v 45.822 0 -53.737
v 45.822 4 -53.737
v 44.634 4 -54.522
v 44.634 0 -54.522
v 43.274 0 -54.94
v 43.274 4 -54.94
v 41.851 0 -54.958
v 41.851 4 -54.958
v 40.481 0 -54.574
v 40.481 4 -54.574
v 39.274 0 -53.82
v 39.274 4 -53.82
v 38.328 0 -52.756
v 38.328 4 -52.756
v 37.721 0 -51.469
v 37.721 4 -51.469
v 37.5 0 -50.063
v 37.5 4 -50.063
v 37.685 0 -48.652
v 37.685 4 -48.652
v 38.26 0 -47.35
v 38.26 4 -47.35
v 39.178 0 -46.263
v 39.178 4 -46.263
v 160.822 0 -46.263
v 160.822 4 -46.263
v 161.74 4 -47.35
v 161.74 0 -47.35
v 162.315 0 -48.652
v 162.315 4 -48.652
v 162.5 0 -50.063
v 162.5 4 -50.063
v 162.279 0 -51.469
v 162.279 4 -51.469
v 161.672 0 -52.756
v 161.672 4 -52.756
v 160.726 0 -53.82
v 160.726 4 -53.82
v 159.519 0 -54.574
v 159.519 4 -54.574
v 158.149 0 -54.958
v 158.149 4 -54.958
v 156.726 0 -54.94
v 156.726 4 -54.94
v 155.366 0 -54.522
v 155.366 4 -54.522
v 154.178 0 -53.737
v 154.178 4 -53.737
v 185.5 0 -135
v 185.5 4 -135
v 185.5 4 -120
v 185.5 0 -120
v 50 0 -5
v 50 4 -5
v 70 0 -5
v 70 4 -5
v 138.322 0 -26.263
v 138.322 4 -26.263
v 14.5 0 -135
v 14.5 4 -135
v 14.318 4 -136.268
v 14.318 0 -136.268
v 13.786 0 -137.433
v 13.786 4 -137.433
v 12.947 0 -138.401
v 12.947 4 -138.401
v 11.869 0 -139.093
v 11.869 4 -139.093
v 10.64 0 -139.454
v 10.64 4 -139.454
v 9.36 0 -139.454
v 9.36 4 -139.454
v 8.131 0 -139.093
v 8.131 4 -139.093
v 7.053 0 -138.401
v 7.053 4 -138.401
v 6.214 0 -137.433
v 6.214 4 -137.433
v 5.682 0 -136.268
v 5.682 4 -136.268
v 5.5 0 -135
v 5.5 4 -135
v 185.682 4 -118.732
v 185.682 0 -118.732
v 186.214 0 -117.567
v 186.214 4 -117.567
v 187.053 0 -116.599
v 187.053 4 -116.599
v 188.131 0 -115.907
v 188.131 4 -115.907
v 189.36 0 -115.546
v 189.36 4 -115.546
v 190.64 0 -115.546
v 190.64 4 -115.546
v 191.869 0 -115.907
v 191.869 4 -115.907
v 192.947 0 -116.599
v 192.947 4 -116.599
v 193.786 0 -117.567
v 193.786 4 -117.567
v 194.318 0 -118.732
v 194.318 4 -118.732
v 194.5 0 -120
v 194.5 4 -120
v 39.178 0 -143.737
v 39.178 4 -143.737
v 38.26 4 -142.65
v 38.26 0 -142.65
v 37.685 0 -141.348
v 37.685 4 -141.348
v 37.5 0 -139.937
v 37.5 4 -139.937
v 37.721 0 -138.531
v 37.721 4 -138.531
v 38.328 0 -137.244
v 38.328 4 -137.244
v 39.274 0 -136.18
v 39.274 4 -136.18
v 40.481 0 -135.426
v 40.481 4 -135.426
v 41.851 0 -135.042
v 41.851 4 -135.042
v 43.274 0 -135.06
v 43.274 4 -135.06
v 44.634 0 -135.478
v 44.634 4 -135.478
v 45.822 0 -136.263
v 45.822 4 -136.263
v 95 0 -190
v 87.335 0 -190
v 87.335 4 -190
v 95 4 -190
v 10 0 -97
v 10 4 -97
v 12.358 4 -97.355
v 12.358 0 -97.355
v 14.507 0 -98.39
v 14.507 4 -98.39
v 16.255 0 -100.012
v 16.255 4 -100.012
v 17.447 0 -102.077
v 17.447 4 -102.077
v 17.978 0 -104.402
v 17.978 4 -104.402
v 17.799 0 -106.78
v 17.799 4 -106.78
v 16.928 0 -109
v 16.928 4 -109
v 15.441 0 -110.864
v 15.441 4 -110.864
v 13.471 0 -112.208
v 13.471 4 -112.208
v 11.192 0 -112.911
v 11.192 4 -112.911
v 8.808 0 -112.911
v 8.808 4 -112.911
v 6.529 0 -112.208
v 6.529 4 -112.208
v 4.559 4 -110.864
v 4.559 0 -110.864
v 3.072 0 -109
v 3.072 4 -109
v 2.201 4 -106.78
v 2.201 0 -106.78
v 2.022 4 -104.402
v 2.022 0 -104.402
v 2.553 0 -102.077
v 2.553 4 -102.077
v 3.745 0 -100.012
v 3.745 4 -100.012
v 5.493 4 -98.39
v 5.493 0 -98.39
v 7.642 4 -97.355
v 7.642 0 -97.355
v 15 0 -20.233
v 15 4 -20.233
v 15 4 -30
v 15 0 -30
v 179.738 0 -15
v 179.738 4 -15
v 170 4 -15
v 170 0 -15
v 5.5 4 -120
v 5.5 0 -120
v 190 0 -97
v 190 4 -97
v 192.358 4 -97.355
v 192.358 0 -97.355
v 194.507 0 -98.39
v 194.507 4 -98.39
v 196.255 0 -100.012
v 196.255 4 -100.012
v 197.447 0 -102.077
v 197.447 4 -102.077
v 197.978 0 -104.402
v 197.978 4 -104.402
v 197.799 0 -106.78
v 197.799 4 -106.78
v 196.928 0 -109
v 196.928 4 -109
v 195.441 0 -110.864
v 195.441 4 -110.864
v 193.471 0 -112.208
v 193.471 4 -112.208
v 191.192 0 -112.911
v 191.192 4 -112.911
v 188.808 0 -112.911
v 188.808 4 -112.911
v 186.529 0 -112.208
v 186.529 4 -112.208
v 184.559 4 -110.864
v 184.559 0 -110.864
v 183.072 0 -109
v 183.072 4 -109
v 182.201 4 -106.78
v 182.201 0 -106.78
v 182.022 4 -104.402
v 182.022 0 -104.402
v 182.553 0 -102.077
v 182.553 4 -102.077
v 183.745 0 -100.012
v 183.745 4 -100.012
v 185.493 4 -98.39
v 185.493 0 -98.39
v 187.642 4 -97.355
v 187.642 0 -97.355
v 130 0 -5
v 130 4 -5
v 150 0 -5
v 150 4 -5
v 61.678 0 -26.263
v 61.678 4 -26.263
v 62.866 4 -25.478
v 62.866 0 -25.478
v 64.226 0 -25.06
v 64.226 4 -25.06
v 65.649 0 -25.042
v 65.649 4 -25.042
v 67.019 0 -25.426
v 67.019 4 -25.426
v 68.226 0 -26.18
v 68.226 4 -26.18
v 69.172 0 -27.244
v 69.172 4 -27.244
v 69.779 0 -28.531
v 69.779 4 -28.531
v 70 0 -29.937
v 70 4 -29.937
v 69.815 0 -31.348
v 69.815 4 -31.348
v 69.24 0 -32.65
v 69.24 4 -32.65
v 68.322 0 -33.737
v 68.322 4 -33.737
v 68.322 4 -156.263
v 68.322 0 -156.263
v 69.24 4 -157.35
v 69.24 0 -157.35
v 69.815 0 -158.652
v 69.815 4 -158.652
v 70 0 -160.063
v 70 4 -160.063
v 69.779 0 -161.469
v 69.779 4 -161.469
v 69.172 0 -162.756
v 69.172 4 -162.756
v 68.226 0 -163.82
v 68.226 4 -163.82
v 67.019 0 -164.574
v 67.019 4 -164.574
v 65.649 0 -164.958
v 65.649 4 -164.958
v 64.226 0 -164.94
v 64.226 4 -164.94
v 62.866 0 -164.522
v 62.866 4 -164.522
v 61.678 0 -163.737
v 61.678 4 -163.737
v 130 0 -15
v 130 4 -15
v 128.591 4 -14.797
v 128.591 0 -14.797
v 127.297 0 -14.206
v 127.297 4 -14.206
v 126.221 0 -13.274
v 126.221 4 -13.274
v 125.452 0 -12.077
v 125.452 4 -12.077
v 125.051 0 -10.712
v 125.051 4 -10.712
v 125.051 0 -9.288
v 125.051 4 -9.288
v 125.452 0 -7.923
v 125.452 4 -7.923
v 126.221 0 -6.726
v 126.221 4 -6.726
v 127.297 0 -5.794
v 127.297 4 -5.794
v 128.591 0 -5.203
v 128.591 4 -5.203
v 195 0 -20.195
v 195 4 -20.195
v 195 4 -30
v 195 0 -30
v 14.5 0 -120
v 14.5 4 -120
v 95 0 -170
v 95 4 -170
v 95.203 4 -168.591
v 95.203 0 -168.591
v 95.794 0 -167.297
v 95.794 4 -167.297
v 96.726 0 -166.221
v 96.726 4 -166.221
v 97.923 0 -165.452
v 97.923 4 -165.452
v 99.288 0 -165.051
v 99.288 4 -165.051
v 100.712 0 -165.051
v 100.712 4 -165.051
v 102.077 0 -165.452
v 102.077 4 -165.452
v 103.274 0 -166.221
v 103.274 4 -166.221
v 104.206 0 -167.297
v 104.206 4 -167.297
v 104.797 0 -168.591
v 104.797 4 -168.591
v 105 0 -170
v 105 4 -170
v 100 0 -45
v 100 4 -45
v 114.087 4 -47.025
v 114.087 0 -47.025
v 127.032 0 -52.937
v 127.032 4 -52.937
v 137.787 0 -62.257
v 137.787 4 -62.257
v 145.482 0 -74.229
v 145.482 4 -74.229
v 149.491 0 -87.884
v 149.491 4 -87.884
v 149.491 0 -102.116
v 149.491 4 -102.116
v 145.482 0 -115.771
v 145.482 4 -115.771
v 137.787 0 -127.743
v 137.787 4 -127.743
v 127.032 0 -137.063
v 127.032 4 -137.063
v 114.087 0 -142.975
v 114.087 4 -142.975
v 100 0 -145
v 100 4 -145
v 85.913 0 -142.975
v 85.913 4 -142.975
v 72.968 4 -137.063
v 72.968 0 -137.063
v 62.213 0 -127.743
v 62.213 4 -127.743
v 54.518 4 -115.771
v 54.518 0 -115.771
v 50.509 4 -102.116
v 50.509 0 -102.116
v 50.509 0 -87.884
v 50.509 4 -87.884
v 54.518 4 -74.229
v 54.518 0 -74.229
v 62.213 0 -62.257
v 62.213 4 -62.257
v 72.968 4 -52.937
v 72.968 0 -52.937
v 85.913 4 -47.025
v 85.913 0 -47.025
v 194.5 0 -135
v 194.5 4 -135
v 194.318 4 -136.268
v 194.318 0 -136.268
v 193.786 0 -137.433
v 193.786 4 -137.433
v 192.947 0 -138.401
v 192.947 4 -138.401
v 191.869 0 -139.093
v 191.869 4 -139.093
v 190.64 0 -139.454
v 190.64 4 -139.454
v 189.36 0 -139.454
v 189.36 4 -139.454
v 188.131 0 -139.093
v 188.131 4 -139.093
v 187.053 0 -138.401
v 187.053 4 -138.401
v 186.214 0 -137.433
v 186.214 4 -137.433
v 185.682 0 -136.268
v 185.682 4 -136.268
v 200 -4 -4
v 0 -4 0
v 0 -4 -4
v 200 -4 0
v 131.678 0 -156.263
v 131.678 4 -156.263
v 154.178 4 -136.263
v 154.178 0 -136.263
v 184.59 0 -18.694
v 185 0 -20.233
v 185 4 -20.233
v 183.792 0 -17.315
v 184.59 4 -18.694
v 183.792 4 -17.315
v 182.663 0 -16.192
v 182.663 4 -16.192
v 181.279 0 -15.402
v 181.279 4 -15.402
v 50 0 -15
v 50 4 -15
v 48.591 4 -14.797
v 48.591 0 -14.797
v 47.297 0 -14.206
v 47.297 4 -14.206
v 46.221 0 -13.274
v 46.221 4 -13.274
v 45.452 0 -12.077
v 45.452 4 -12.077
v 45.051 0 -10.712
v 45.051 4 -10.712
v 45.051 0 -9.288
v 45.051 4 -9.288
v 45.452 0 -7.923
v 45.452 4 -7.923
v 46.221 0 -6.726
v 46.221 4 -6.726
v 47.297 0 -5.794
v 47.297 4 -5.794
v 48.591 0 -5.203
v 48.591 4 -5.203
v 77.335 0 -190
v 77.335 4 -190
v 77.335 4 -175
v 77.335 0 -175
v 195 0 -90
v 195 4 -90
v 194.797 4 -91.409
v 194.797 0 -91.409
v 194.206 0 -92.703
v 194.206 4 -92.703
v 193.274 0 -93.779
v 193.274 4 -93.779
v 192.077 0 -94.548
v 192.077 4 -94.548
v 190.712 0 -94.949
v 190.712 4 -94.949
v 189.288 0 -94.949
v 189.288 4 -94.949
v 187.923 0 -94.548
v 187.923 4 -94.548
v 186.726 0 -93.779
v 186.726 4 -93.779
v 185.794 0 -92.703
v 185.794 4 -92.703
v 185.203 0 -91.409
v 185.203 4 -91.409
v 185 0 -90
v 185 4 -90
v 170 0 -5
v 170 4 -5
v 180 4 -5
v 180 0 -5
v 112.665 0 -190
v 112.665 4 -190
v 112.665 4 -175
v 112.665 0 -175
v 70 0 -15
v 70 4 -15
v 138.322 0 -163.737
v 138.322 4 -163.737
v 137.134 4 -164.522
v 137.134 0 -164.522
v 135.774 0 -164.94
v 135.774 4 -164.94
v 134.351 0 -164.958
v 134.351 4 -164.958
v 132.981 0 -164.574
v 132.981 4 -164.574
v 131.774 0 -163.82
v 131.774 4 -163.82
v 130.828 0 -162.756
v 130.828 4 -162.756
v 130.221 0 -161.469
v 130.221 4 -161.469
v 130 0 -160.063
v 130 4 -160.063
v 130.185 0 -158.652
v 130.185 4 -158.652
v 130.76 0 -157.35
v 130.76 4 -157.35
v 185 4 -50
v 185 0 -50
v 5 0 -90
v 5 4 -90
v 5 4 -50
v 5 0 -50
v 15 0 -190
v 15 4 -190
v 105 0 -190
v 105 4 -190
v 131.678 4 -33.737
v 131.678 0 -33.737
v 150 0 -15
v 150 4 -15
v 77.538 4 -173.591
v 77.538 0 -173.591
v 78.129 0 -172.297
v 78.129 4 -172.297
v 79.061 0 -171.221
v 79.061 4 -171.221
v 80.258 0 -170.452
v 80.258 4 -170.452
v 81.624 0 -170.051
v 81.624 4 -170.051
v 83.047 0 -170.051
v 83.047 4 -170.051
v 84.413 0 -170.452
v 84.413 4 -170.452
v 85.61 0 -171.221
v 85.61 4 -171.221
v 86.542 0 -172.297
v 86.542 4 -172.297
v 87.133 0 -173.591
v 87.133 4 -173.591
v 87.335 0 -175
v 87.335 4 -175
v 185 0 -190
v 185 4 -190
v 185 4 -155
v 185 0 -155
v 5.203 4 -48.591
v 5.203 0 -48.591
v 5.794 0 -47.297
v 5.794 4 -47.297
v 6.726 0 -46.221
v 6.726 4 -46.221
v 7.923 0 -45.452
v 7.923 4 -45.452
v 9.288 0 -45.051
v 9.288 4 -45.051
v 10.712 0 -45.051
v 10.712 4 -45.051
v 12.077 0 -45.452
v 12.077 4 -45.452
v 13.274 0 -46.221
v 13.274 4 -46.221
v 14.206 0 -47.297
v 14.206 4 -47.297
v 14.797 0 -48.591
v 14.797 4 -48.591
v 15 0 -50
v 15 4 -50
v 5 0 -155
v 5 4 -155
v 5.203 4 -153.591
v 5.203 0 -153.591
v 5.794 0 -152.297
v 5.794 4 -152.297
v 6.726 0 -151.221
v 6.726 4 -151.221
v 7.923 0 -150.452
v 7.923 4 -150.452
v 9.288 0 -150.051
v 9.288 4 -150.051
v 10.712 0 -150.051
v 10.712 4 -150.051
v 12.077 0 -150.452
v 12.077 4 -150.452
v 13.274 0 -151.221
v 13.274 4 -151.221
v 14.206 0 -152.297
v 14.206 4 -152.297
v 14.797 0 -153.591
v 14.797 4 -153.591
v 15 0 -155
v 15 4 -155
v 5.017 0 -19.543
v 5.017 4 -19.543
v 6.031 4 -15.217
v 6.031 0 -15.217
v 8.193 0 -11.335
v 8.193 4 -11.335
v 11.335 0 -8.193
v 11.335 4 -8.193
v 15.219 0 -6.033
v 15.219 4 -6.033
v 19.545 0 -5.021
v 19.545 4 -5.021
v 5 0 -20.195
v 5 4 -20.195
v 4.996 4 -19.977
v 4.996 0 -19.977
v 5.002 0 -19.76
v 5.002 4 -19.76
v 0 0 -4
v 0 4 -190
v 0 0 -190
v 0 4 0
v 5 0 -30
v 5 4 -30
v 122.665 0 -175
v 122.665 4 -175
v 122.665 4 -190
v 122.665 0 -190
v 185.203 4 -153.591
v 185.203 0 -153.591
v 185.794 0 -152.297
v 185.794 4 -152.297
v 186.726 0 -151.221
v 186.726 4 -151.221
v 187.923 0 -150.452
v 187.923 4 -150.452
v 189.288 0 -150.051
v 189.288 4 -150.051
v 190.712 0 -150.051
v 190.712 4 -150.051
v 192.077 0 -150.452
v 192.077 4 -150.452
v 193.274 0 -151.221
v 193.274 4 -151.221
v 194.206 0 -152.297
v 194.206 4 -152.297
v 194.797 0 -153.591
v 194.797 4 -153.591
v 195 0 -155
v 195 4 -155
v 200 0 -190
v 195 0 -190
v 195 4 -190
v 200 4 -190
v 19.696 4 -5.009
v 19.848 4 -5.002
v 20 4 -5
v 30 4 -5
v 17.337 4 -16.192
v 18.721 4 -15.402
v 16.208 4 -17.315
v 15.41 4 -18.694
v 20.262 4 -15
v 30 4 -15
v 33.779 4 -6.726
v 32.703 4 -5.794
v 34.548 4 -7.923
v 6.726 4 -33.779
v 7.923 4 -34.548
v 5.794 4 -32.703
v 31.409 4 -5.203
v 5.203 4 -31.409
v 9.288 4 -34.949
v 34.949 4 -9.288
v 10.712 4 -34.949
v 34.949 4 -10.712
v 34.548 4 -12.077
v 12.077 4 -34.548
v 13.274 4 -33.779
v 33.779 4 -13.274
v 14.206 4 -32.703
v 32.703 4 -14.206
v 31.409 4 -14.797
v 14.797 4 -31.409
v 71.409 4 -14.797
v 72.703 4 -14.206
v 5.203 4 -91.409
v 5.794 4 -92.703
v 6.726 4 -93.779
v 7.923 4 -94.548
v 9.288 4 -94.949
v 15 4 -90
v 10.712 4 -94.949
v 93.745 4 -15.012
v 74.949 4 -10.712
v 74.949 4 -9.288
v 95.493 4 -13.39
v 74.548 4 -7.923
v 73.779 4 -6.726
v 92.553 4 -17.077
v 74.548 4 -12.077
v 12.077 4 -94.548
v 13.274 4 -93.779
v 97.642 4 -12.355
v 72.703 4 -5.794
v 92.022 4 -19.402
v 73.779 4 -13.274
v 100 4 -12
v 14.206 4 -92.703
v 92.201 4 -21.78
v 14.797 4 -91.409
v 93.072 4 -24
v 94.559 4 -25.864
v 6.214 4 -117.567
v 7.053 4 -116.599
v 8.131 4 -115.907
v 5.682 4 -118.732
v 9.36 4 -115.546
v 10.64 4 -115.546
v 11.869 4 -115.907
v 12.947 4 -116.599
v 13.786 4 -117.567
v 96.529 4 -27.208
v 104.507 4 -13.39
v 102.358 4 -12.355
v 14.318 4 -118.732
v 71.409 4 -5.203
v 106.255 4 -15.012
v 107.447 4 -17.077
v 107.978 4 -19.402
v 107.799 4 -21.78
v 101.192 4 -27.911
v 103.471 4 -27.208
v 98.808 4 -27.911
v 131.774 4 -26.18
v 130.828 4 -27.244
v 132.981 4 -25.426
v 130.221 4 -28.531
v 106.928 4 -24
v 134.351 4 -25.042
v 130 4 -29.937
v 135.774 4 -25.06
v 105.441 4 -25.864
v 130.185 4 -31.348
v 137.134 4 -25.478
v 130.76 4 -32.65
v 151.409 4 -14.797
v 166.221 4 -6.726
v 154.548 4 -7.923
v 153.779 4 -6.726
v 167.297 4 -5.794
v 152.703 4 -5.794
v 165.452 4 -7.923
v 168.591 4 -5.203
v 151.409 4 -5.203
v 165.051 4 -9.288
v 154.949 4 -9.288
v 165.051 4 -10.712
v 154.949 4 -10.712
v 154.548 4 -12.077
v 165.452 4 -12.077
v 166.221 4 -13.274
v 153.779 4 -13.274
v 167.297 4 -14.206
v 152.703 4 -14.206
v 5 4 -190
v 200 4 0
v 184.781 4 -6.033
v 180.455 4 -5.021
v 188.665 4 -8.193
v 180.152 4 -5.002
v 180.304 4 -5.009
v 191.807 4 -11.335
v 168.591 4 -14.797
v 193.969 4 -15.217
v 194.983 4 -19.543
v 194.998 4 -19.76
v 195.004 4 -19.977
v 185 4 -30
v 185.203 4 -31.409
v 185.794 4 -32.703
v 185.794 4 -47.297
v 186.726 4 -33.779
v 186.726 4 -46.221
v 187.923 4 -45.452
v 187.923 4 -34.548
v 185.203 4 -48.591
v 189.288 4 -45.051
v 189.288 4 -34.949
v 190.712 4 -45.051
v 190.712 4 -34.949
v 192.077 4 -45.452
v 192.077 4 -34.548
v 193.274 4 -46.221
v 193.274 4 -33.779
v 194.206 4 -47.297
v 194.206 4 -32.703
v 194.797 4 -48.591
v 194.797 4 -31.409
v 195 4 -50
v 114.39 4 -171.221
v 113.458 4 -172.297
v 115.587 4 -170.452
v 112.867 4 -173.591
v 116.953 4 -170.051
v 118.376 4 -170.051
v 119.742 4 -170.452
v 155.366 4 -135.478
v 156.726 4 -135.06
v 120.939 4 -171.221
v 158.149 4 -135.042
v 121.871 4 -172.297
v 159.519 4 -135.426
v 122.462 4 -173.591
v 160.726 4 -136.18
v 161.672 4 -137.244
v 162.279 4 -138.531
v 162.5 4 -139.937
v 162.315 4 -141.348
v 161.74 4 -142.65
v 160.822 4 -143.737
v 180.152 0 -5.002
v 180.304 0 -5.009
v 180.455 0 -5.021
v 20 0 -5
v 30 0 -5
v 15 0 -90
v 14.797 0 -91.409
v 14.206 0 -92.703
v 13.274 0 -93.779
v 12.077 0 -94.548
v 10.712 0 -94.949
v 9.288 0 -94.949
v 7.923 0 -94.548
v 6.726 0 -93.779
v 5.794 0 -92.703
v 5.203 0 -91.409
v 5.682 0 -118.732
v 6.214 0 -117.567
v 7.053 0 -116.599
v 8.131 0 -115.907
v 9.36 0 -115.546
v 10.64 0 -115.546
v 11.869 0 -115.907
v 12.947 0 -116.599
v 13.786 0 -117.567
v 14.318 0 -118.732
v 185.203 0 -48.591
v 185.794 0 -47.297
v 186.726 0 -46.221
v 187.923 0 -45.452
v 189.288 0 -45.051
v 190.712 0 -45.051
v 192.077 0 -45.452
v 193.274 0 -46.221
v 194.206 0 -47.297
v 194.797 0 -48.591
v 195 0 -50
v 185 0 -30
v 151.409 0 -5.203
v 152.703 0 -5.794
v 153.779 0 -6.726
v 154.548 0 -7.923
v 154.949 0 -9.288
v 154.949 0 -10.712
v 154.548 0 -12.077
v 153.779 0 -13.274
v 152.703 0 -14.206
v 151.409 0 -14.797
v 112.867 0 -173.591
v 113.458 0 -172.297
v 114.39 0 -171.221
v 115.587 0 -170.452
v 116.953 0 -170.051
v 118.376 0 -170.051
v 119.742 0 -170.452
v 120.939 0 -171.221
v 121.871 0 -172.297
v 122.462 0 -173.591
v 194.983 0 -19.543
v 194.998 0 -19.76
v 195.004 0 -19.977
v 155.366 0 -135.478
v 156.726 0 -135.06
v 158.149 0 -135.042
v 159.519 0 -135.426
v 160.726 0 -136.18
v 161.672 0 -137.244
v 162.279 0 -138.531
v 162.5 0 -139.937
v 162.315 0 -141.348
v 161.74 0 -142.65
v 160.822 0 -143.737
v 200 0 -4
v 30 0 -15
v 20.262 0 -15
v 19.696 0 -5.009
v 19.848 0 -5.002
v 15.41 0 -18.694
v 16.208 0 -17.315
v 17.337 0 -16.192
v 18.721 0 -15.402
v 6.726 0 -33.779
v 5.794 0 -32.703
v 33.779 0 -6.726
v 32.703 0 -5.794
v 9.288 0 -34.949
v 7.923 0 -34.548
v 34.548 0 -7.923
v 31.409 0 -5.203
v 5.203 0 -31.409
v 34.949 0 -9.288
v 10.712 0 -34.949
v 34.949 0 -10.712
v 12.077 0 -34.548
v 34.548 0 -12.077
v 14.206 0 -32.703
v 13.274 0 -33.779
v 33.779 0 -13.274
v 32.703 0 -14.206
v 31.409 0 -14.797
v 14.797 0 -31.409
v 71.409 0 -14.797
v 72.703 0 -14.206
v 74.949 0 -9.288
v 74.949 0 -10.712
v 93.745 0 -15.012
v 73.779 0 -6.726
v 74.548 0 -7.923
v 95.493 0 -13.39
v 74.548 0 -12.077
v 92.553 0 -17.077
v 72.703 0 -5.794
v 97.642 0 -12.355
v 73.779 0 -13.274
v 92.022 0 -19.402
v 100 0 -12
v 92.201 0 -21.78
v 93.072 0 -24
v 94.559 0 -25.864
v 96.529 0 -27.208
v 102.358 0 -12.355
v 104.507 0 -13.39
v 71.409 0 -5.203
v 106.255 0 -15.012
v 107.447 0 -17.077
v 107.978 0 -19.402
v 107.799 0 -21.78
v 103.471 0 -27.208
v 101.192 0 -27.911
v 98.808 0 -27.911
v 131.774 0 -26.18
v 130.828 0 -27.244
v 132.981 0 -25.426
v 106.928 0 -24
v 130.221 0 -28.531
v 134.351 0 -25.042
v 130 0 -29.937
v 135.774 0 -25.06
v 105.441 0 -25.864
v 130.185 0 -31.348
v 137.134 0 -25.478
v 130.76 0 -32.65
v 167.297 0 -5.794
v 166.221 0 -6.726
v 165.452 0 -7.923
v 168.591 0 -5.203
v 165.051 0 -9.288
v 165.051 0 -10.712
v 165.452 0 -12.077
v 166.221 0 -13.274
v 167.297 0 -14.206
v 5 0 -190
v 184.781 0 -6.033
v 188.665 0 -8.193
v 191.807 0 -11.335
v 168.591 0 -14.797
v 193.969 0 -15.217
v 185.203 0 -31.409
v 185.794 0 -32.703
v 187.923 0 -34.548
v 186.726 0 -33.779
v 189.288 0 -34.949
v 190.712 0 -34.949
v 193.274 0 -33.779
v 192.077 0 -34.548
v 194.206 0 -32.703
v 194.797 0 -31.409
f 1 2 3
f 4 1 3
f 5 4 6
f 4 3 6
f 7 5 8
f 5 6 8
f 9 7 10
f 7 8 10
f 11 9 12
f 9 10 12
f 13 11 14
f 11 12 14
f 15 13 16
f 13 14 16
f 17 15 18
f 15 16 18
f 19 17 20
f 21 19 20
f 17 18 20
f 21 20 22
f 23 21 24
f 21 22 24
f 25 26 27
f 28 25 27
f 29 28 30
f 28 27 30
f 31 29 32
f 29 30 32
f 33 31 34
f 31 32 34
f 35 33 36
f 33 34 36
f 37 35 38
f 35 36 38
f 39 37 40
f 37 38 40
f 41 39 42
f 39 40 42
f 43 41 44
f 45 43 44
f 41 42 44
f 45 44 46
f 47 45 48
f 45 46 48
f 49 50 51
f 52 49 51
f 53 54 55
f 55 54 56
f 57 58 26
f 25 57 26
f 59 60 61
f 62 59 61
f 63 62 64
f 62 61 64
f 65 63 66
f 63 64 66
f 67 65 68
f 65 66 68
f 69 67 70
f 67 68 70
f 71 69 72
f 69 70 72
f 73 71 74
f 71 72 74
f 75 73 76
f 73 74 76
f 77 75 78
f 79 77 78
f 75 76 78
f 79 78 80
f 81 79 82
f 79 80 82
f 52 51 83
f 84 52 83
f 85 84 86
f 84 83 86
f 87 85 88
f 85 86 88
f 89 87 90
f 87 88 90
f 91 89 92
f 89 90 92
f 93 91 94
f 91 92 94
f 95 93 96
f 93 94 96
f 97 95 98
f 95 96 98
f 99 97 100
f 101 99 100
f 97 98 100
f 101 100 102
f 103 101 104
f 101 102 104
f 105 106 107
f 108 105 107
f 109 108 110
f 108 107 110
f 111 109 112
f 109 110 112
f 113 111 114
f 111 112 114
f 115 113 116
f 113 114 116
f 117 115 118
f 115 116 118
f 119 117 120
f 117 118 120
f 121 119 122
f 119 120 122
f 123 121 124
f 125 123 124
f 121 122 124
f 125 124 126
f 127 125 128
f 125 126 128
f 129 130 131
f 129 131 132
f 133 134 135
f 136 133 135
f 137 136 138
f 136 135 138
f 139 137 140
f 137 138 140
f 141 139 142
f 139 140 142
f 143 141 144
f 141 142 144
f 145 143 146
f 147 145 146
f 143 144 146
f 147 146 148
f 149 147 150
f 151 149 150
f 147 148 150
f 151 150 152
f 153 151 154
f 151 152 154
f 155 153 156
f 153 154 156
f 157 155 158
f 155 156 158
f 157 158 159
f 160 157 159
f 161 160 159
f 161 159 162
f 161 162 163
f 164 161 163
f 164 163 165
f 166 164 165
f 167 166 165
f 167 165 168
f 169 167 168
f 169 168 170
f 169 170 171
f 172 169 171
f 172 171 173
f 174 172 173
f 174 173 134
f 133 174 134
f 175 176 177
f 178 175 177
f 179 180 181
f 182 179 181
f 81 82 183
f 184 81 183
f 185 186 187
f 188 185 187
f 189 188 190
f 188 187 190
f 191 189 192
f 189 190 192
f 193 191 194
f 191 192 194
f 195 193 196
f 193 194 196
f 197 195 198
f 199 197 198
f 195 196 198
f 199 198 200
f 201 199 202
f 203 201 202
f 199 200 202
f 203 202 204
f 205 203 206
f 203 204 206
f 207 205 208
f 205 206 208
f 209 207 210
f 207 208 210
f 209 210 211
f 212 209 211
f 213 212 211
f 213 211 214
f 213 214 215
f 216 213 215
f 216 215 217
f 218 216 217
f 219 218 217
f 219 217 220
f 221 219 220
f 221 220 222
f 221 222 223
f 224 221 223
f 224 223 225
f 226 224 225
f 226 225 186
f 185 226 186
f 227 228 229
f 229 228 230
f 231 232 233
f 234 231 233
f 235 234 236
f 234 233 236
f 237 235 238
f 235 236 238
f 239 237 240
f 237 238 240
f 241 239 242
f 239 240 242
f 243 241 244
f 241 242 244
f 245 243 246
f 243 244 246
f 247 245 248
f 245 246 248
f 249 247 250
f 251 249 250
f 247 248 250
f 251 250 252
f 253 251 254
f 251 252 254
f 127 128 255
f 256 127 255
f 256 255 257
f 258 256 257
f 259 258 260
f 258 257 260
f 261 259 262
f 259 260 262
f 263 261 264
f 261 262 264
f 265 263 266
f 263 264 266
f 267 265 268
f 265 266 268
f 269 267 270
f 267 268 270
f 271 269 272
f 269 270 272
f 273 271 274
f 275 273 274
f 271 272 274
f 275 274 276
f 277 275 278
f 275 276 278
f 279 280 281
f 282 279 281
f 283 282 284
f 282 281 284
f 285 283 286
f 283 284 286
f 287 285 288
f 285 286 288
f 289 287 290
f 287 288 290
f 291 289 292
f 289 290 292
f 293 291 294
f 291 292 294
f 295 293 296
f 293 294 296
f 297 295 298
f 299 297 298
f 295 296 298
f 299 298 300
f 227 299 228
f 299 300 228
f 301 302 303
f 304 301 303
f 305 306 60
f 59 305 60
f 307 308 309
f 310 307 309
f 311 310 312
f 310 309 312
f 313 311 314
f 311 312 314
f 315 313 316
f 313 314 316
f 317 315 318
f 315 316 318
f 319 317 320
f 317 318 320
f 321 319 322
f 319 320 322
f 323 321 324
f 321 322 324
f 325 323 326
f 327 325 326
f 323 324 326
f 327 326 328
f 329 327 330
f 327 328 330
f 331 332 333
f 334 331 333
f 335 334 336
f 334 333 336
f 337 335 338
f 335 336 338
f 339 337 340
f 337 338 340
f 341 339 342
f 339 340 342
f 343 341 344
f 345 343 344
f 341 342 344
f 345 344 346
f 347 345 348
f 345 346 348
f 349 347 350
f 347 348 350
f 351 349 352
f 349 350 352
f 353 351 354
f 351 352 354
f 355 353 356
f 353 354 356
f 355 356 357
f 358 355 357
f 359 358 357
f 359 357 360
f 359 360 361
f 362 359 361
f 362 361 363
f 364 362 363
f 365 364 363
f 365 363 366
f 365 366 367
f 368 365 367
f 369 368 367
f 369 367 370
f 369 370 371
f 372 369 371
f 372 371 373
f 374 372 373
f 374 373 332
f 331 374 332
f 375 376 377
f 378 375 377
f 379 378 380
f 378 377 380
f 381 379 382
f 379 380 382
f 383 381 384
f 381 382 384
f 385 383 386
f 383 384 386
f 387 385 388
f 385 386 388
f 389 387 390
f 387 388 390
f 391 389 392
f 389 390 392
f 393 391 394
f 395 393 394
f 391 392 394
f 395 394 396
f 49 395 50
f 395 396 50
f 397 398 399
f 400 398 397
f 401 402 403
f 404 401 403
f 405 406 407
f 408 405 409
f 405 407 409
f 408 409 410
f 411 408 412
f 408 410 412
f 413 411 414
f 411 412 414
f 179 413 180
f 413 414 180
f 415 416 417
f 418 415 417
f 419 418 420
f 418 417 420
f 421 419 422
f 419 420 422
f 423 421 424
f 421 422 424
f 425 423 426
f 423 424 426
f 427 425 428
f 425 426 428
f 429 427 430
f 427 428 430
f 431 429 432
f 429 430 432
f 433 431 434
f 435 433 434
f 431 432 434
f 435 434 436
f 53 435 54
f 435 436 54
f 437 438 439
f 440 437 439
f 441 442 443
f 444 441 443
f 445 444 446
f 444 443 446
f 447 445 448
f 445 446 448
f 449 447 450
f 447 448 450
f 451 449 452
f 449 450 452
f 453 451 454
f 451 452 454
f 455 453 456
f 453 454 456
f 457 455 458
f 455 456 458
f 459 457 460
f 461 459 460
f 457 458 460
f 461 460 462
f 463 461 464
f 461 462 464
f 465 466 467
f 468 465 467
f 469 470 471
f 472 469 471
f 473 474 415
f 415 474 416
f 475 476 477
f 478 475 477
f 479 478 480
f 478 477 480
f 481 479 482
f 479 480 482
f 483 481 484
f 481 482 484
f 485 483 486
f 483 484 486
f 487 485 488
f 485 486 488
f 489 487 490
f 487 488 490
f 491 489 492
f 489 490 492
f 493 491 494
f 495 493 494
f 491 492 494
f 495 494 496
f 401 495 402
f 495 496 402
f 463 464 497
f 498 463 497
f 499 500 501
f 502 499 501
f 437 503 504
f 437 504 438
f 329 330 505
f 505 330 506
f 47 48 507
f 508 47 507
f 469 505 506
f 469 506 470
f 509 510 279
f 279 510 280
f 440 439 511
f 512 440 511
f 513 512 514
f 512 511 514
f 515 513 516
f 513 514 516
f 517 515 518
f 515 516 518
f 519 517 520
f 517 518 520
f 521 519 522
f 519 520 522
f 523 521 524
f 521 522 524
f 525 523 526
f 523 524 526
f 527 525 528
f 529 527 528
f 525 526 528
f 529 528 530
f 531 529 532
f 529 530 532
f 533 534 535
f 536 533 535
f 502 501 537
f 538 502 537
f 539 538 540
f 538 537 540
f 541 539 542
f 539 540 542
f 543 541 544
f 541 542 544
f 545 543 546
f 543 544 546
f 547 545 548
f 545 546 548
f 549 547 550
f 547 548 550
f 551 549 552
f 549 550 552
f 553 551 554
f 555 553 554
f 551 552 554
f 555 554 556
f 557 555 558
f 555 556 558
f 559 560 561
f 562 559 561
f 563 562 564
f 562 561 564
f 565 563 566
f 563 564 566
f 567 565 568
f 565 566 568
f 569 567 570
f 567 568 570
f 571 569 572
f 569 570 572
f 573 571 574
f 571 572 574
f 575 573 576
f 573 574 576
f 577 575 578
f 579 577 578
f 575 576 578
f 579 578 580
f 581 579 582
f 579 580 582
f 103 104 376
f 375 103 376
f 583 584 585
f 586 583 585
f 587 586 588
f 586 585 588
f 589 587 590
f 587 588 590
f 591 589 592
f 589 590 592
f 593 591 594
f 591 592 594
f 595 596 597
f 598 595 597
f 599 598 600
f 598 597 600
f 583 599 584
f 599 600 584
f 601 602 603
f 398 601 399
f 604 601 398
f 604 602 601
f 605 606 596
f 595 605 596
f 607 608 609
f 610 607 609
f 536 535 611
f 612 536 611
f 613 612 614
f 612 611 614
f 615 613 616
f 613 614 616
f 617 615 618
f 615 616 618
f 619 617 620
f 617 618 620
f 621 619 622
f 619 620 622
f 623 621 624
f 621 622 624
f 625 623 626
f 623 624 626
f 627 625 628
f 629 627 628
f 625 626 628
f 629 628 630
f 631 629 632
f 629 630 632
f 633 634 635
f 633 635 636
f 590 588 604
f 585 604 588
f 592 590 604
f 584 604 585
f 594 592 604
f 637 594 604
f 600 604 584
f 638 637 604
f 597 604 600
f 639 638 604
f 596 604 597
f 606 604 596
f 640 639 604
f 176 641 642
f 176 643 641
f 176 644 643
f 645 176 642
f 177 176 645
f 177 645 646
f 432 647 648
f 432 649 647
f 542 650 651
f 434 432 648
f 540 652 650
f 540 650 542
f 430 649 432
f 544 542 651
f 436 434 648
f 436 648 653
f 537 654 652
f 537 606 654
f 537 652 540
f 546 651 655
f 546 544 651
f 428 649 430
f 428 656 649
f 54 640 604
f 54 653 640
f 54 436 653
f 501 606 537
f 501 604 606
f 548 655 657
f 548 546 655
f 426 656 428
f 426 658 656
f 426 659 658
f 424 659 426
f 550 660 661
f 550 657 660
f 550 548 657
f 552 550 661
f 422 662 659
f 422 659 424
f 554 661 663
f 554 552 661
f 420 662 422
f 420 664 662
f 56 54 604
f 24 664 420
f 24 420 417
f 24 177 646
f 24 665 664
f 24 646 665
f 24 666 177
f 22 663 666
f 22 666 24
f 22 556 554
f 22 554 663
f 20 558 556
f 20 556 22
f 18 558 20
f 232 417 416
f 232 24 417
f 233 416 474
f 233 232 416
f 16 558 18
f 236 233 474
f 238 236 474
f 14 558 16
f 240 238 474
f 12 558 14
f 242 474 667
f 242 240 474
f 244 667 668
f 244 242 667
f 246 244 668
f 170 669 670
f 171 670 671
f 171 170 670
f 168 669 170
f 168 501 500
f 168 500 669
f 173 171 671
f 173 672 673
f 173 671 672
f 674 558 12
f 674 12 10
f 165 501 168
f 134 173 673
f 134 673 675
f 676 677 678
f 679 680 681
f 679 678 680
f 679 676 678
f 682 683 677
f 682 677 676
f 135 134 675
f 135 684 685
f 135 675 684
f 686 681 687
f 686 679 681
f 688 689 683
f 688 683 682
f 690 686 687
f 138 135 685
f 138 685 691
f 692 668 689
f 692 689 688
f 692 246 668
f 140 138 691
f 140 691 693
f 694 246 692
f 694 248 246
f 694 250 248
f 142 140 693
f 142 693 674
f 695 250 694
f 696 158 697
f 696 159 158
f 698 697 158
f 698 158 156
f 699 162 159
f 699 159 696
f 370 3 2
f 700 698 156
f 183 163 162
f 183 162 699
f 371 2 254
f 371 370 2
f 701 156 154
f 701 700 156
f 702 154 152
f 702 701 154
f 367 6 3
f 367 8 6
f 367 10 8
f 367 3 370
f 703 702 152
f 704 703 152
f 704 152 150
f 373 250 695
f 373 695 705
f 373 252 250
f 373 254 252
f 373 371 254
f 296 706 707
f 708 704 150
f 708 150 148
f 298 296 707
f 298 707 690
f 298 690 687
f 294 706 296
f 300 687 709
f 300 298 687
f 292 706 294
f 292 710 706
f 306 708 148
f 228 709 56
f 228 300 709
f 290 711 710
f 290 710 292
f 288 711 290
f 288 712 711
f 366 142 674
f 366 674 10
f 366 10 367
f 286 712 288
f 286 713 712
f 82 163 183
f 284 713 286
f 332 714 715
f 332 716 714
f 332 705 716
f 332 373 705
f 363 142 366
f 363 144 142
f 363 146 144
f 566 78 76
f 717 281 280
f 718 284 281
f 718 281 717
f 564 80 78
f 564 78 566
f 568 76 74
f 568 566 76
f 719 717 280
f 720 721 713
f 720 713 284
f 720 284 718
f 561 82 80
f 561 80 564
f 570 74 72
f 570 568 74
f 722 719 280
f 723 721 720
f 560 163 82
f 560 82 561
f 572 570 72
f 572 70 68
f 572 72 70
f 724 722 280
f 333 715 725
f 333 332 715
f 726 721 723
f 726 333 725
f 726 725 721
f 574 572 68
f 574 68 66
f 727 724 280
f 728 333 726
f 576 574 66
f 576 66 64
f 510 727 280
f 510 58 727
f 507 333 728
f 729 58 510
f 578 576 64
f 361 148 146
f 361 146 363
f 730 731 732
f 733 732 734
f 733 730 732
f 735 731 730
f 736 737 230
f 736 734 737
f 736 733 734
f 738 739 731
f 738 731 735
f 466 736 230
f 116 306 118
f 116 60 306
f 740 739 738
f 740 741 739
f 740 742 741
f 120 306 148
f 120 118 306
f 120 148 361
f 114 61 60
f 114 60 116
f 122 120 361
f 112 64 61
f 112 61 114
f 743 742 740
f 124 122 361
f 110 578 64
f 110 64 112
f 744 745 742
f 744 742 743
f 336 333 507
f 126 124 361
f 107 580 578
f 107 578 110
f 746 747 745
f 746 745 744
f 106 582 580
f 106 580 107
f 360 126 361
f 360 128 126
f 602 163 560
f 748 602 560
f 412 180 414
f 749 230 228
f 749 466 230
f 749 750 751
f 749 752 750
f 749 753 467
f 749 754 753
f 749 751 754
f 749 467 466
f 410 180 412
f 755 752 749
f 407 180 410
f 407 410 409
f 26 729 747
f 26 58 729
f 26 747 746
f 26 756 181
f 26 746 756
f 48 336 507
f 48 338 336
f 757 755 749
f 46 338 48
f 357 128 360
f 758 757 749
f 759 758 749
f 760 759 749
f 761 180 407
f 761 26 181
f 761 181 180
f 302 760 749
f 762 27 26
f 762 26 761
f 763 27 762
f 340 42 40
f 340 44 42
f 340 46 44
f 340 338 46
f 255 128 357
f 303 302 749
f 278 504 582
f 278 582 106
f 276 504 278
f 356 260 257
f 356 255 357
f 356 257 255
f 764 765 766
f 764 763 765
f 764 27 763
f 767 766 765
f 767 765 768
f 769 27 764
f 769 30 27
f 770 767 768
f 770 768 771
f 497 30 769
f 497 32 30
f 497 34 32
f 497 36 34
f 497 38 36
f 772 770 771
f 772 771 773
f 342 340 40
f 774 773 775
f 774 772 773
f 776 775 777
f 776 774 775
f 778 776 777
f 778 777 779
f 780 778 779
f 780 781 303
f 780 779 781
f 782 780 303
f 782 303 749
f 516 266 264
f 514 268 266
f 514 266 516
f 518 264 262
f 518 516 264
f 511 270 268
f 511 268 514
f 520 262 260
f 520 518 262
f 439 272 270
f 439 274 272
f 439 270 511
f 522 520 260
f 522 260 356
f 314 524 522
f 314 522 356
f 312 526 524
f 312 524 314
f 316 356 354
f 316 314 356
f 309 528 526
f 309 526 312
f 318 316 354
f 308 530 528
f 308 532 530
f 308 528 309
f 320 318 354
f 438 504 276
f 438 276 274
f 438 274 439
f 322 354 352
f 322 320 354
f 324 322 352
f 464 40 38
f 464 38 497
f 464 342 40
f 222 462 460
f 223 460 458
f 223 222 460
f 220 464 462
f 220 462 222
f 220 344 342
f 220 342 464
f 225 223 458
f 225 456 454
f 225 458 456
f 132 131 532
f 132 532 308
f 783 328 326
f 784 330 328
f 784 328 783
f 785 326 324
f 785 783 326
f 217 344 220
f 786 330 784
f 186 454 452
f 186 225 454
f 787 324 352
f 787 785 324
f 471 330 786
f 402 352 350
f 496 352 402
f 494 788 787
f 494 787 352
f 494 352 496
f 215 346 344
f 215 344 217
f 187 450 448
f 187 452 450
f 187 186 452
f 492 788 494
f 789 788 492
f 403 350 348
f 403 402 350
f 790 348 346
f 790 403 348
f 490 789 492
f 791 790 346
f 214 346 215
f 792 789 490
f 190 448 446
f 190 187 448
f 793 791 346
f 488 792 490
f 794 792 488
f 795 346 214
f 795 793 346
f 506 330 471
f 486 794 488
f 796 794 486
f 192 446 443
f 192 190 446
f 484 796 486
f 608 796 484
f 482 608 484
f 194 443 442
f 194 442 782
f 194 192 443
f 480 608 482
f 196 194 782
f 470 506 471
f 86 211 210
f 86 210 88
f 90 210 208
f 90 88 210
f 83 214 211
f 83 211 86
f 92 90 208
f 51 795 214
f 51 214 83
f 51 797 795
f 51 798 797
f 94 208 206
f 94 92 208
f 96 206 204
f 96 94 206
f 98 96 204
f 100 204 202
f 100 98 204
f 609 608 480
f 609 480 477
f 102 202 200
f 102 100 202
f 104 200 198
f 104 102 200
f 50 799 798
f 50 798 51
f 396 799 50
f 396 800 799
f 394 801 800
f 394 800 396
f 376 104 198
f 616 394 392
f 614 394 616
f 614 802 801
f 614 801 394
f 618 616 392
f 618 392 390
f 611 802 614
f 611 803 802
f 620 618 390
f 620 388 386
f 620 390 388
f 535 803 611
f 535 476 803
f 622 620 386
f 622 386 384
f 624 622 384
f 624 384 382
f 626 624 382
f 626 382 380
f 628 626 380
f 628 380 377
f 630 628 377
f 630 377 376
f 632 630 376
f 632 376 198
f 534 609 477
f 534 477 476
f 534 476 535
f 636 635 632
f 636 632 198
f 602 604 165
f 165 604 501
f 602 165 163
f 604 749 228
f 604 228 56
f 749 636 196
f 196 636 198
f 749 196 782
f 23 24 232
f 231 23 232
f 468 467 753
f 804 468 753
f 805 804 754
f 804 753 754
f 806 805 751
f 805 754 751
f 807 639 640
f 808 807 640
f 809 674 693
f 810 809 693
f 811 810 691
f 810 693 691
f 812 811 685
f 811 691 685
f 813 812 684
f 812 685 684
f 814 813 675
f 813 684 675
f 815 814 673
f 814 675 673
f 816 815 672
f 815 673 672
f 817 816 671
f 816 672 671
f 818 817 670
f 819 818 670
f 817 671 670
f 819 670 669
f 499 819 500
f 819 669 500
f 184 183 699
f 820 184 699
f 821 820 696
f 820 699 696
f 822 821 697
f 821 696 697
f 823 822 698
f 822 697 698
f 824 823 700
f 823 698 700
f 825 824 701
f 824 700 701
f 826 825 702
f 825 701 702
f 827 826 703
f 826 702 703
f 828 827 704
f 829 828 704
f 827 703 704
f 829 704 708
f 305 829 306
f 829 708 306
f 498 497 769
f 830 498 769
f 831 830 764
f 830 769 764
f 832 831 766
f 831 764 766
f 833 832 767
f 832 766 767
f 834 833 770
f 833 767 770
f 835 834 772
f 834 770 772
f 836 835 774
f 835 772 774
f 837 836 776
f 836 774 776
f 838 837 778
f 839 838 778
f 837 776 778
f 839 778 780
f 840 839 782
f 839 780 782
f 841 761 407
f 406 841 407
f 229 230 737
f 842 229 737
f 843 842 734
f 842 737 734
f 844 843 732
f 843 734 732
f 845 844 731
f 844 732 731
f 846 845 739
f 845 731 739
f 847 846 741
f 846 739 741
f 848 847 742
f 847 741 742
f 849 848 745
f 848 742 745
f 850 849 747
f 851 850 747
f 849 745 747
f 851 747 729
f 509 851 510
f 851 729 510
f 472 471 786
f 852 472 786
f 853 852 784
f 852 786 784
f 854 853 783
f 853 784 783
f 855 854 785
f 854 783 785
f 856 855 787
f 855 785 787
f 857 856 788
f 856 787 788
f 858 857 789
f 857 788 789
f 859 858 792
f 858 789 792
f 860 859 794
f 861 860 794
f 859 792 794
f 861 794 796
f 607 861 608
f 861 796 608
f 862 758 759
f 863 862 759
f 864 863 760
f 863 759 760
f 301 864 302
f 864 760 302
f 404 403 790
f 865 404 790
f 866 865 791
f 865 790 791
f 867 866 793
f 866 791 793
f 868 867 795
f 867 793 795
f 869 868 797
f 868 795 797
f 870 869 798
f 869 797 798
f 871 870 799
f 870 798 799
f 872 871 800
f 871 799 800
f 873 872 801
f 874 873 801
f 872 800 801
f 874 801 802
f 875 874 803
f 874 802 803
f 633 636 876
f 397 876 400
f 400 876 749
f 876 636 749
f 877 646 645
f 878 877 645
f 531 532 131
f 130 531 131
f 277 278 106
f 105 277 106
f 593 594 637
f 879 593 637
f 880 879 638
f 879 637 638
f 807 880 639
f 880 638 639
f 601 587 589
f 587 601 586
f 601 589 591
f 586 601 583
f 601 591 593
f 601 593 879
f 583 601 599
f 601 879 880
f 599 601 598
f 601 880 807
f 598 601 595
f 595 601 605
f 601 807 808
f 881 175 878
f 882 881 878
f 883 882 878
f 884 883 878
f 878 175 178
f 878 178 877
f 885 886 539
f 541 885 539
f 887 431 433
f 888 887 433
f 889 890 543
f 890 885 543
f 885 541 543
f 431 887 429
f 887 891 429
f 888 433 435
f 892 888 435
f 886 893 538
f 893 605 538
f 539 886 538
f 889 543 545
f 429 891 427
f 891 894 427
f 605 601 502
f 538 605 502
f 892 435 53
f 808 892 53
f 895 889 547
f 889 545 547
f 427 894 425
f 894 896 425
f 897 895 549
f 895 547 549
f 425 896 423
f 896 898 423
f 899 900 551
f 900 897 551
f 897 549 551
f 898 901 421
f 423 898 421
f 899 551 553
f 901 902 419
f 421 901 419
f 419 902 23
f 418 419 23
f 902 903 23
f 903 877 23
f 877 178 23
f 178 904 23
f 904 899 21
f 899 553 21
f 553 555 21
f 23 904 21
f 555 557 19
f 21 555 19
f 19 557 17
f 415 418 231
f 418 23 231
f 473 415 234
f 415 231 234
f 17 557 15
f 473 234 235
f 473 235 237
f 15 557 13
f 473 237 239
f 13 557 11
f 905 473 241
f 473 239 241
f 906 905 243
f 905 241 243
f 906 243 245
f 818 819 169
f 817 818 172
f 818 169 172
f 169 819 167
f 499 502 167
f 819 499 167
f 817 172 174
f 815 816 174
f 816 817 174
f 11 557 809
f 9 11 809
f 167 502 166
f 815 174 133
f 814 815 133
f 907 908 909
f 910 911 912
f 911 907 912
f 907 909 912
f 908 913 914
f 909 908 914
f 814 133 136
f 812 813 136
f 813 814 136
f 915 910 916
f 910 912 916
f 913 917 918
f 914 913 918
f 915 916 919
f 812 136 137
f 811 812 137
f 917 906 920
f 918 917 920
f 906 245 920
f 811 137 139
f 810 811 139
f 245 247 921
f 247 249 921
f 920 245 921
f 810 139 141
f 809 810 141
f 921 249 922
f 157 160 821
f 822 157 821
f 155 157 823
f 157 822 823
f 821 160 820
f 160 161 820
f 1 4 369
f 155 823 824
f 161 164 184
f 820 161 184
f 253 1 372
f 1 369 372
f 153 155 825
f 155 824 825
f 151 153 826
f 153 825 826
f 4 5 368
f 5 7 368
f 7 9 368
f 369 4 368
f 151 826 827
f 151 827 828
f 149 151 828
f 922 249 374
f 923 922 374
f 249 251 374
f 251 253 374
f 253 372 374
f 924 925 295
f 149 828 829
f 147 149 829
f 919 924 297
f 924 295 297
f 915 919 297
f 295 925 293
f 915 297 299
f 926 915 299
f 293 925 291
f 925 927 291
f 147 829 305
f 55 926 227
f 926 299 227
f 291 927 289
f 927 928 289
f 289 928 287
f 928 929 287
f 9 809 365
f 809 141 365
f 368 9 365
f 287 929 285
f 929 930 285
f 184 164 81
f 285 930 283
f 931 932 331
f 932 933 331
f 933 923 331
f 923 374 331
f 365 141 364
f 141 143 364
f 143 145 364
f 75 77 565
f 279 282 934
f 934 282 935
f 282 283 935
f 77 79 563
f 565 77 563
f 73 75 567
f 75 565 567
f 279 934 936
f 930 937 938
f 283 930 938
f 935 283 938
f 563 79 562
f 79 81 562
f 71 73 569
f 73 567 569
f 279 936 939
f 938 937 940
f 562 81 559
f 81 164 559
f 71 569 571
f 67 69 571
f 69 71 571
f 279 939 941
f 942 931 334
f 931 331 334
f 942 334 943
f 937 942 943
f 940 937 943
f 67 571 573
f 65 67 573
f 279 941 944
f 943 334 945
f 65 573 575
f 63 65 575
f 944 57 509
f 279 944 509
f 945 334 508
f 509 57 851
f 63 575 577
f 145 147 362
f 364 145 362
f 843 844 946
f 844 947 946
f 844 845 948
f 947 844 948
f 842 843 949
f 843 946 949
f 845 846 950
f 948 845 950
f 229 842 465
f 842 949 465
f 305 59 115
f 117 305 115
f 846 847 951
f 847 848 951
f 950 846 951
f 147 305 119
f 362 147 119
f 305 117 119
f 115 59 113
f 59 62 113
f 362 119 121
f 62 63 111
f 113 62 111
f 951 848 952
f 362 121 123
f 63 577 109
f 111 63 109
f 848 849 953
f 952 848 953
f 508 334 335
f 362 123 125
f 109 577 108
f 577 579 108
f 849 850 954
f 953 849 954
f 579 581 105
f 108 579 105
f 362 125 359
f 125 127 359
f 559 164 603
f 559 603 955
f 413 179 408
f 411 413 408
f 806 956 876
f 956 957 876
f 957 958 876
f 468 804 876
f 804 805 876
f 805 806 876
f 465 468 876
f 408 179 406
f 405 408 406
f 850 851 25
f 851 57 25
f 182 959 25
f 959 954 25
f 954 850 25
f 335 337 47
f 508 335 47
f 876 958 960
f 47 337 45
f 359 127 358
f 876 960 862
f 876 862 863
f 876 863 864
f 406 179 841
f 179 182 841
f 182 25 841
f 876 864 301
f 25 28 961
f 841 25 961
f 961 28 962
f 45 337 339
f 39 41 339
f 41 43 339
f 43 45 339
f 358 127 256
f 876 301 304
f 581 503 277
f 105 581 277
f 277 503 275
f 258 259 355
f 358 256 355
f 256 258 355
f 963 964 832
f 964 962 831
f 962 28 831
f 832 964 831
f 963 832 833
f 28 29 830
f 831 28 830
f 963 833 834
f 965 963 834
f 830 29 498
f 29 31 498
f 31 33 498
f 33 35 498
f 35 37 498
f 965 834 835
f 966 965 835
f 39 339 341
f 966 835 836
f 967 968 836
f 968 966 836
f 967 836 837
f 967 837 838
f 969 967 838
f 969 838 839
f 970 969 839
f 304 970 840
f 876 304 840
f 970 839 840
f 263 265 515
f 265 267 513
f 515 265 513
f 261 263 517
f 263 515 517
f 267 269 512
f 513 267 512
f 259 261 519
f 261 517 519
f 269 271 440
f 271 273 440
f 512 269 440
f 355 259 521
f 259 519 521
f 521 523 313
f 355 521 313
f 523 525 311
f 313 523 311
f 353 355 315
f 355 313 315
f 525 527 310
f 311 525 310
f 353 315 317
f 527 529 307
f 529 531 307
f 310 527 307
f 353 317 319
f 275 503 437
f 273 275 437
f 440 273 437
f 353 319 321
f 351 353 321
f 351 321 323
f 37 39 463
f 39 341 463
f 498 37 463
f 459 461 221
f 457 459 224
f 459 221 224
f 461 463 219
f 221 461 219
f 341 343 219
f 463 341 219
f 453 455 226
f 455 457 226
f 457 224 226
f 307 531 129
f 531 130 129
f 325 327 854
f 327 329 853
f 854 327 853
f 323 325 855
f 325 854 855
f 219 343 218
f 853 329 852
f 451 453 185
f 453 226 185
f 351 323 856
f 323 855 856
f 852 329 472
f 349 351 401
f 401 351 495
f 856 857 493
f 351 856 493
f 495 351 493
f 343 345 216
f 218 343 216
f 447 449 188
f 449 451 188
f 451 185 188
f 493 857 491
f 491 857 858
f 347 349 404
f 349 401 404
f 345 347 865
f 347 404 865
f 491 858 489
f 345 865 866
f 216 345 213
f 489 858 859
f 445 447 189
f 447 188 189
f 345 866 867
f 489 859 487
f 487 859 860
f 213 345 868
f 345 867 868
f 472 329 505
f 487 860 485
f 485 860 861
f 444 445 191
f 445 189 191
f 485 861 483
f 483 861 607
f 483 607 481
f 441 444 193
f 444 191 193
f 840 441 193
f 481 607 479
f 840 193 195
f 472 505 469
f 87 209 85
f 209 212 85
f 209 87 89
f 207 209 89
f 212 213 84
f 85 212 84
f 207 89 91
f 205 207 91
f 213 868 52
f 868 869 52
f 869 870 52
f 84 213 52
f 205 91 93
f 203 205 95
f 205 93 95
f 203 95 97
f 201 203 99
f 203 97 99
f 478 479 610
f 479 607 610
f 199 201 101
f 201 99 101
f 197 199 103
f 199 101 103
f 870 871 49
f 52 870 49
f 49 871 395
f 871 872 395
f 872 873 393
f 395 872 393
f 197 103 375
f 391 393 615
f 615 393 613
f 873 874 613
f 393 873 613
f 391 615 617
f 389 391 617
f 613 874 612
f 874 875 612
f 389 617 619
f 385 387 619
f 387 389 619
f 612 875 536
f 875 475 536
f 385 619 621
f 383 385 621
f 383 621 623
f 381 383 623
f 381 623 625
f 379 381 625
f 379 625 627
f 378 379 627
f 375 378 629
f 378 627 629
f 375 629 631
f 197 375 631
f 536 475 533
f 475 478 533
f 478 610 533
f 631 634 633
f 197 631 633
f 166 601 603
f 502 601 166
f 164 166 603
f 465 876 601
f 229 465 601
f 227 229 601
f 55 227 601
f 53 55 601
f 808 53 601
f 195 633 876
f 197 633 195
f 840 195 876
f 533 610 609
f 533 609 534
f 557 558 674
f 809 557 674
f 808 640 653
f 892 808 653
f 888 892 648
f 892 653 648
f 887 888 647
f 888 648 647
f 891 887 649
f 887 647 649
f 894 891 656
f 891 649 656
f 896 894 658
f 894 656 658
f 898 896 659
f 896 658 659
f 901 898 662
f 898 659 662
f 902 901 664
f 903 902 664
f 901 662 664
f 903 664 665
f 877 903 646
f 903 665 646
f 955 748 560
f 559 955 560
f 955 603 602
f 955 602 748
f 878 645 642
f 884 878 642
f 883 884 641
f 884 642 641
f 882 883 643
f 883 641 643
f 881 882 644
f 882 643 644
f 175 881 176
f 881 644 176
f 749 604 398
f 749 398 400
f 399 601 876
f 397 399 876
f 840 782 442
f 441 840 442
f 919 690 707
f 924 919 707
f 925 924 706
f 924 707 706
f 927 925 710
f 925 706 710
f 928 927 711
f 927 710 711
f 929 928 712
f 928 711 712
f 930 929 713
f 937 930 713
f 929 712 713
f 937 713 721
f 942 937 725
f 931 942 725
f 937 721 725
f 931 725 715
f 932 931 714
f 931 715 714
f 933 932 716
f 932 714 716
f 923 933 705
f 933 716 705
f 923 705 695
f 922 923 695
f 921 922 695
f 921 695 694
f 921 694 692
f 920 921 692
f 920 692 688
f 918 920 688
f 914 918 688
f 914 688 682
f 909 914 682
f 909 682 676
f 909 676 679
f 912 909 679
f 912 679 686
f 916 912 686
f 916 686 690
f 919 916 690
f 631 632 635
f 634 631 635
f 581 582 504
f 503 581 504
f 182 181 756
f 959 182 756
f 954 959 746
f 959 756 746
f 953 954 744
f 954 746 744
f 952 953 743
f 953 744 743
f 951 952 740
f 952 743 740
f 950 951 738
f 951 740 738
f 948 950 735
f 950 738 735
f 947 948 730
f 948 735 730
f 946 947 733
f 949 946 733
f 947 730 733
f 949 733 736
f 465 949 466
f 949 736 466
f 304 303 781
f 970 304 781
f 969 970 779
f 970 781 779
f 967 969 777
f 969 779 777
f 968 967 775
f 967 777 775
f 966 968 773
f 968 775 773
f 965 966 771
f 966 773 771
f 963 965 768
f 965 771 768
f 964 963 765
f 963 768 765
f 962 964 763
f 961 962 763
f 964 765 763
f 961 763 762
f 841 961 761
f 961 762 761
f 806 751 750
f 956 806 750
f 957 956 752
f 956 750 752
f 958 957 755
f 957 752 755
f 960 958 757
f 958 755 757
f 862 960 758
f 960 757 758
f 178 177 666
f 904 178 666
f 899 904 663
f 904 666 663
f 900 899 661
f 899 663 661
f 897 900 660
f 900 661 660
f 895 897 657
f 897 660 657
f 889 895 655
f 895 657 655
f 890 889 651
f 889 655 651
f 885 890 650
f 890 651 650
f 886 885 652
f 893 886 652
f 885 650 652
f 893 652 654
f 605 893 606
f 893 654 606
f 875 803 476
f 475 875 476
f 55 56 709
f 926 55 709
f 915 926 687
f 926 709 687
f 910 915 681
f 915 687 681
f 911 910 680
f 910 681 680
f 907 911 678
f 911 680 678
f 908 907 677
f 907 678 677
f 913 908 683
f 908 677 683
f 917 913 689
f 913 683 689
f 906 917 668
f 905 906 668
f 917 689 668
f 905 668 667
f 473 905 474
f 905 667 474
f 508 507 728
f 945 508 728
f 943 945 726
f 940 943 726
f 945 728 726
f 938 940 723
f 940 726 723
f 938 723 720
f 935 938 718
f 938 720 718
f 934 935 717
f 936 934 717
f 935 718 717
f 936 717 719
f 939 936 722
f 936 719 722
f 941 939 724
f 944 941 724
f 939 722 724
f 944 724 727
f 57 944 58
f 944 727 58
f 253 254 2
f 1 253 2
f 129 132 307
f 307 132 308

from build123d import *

# Parameters (mm, degrees)
SKETCH1_W           = 200
SKETCH1_H           = 190
BOSS_EXTRUDE1_DEPTH = 4
SKETCH3_R           = 50
CUT_EXTRUDE5_DEPTH  = 10
SKETCH4_W           = 200
SKETCH4_H           = 4
BOSS_EXTRUDE2_DEPTH = 4
SKETCH_1_R          = 8
CUT_EXTRUDE_1_DEPTH = 10


with BuildPart() as part:
    # Sketch1 → Boss-Extrude1 (new body)
    with BuildSketch(Plane(origin=(0, 0, 0), x_dir=(1, 0, 0), z_dir=(0, 1, 0))):
        with Locations((100, 95)):
            Rectangle(SKETCH1_W, SKETCH1_H)
    extrude(amount=BOSS_EXTRUDE1_DEPTH)

    # Sketch3 → Cut-Extrude5 (cut)
    with BuildSketch(Plane(origin=(0, 4, 0), x_dir=(1, 0, 0), z_dir=(0, 1, 0))):
        with BuildLine():
            Line((30, 15), (20.262068061, 15))
            ThreePointArc((20.262068061, 15), (16.735494747, 16.716132106), (15, 20.233217082))
            Line((15, 20.233217082), (15, 30))
            ThreePointArc((15, 30), (10, 35), (5, 30))
            Line((5, 30), (5, 20.194837008))
            ThreePointArc((5, 20.194837008), (4.997925704, 19.868737095), (5.017113168, 19.54319555))
            ThreePointArc((5.017113168, 19.54319555), (9.654794827, 9.654664453), (19.545086076, 5.020737673))
            ThreePointArc((19.545086076, 5.020737673), (19.772306824, 5.005187109), (20, 5))
            Line((20, 5), (30, 5))
            ThreePointArc((30, 5), (35, 10), (30, 15))
        make_face()
        with BuildLine():
            Line((5, 90), (5, 50))
            ThreePointArc((5, 50), (10, 45), (15, 50))
            Line((15, 50), (15, 90))
            ThreePointArc((15, 90), (10, 95), (5, 90))
        make_face()
        with BuildLine():
            Line((70, 15), (50, 15))
            ThreePointArc((50, 15), (45, 10), (50, 5))
            Line((50, 5), (70, 5))
            ThreePointArc((70, 5), (75, 10), (70, 15))
        make_face()
        with BuildLine():
            ThreePointArc((185, 50), (190, 45), (195, 50))
            Line((195, 50), (195, 90))
            ThreePointArc((195, 90), (190, 95), (185, 90))
            Line((185, 90), (185, 50))
        make_face()
        with BuildLine():
            ThreePointArc((185, 20.233217082), (183.264505253, 16.716132106), (179.737931939, 15))
            Line((179.737931939, 15), (170, 15))
            ThreePointArc((170, 15), (165, 10), (170, 5))
            Line((170, 5), (180, 5))
            ThreePointArc((180, 5), (180.227693176, 5.005187109), (180.454913924, 5.020737673))
            ThreePointArc((180.454913924, 5.020737673), (190.345205173, 9.654664453), (194.982886832, 19.54319555))
            ThreePointArc((194.982886832, 19.54319555), (195.002074296, 19.868737095), (195, 20.194837008))
            Line((195, 20.194837008), (195, 30))
            ThreePointArc((195, 30), (190, 35), (185, 30))
            Line((185, 30), (185, 20.233217082))
        make_face()
        with BuildLine():
            ThreePointArc((150, 5), (155, 10), (150, 15))
            Line((150, 15), (130, 15))
            ThreePointArc((130, 15), (125, 10), (130, 5))
            Line((130, 5), (150, 5))
        make_face()
        with BuildLine():
            ThreePointArc((160.821819194, 46.262953407), (161.237046593, 53.321819194), (154.178180806, 53.737046593))
            Line((154.178180806, 53.737046593), (131.678180806, 33.737046593))
            ThreePointArc((131.678180806, 33.737046593), (131.262953407, 26.678180806), (138.321819194, 26.262953407))
            Line((138.321819194, 26.262953407), (160.821819194, 46.262953407))
        make_face()
        with BuildLine():
            Line((131.678180806, 156.262953407), (154.178180806, 136.262953407))
            ThreePointArc((154.178180806, 136.262953407), (161.237046593, 136.678180806), (160.821819194, 143.737046593))
            Line((160.821819194, 143.737046593), (138.321819194, 163.737046593))
            ThreePointArc((138.321819194, 163.737046593), (131.262953407, 163.321819194), (131.678180806, 156.262953407))
        make_face()
        with BuildLine():
            Line((5.5, 135), (5.5, 120))
            ThreePointArc((5.5, 120), (10, 115.5), (14.5, 120))
            Line((14.5, 120), (14.5, 135))
            ThreePointArc((14.5, 135), (10, 139.5), (5.5, 135))
        make_face()
        with BuildLine():
            ThreePointArc((39.178180806, 143.737046593), (38.762953407, 136.678180806), (45.821819194, 136.262953407))
            Line((45.821819194, 136.262953407), (68.321819194, 156.262953407))
            ThreePointArc((68.321819194, 156.262953407), (68.737046593, 163.321819194), (61.678180806, 163.737046593))
            Line((61.678180806, 163.737046593), (39.178180806, 143.737046593))
        make_face()
        with BuildLine():
            Line((68.321819194, 33.737046593), (45.821819194, 53.737046593))
            ThreePointArc((45.821819194, 53.737046593), (38.762953407, 53.321819194), (39.178180806, 46.262953407))
            Line((39.178180806, 46.262953407), (61.678180806, 26.262953407))
            ThreePointArc((61.678180806, 26.262953407), (68.737046593, 26.678180806), (68.321819194, 33.737046593))
        make_face()
        with BuildLine():
            Line((95, 190), (95, 170))
            ThreePointArc((95, 170), (100, 165), (105, 170))
            Line((105, 170), (105, 190))
            ThreePointArc((105, 190), (100, 195), (95, 190))
        make_face()
        with BuildLine():
            Line((77.335483589, 190), (77.335483589, 175))
            ThreePointArc((77.335483589, 175), (82.335483589, 170), (87.335483589, 175))
            Line((87.335483589, 175), (87.335483589, 190))
            ThreePointArc((87.335483589, 190), (82.335483589, 195), (77.335483589, 190))
        make_face()
        with BuildLine():
            Line((5, 207.20463147), (5, 155))
            ThreePointArc((5, 155), (10, 150), (15, 155))
            Line((15, 155), (15, 207.20463147))
            ThreePointArc((15, 207.20463147), (10, 212.20463147), (5, 207.20463147))
        make_face()
        with BuildLine():
            ThreePointArc((185, 155), (190, 150), (195, 155))
            Line((195, 155), (195, 207.20463147))
            ThreePointArc((195, 207.20463147), (190, 212.20463147), (185, 207.20463147))
            Line((185, 207.20463147), (185, 155))
        make_face()
        with BuildLine():
            ThreePointArc((112.664516411, 175), (117.664516411, 170), (122.664516411, 175))
            Line((122.664516411, 175), (122.664516411, 190))
            ThreePointArc((122.664516411, 190), (117.664516411, 195), (112.664516411, 190))
            Line((112.664516411, 190), (112.664516411, 175))
        make_face()
        with BuildLine():
            ThreePointArc((185.5, 120), (190, 115.5), (194.5, 120))
            Line((194.5, 120), (194.5, 135))
            ThreePointArc((194.5, 135), (190, 139.5), (185.5, 135))
            Line((185.5, 135), (185.5, 120))
        make_face()
        with Locations((100, 95)):
            Circle(SKETCH3_R)
    extrude(amount=-CUT_EXTRUDE5_DEPTH, mode=Mode.SUBTRACT)

    # Sketch4 → Boss-Extrude2 (add)
    with BuildSketch(Plane.XZ):
        with Locations((100, -2)):
            Rectangle(SKETCH4_W, SKETCH4_H)
    extrude(amount=BOSS_EXTRUDE2_DEPTH)

    # ｽｹｯﾁ1 → ｶｯﾄ - 押し出し1 (cut)
    with BuildSketch(Plane(origin=(0, 4, 0), x_dir=(1, 0, 0), z_dir=(0, 1, 0))):
        with Locations((100, 20)):
            Circle(SKETCH_1_R)
        with Locations((190, 105)):
            Circle(SKETCH_1_R)
        with Locations((10, 105)):
            Circle(SKETCH_1_R)
    extrude(amount=-CUT_EXTRUDE_1_DEPTH, mode=Mode.SUBTRACT)


solid = part.part
